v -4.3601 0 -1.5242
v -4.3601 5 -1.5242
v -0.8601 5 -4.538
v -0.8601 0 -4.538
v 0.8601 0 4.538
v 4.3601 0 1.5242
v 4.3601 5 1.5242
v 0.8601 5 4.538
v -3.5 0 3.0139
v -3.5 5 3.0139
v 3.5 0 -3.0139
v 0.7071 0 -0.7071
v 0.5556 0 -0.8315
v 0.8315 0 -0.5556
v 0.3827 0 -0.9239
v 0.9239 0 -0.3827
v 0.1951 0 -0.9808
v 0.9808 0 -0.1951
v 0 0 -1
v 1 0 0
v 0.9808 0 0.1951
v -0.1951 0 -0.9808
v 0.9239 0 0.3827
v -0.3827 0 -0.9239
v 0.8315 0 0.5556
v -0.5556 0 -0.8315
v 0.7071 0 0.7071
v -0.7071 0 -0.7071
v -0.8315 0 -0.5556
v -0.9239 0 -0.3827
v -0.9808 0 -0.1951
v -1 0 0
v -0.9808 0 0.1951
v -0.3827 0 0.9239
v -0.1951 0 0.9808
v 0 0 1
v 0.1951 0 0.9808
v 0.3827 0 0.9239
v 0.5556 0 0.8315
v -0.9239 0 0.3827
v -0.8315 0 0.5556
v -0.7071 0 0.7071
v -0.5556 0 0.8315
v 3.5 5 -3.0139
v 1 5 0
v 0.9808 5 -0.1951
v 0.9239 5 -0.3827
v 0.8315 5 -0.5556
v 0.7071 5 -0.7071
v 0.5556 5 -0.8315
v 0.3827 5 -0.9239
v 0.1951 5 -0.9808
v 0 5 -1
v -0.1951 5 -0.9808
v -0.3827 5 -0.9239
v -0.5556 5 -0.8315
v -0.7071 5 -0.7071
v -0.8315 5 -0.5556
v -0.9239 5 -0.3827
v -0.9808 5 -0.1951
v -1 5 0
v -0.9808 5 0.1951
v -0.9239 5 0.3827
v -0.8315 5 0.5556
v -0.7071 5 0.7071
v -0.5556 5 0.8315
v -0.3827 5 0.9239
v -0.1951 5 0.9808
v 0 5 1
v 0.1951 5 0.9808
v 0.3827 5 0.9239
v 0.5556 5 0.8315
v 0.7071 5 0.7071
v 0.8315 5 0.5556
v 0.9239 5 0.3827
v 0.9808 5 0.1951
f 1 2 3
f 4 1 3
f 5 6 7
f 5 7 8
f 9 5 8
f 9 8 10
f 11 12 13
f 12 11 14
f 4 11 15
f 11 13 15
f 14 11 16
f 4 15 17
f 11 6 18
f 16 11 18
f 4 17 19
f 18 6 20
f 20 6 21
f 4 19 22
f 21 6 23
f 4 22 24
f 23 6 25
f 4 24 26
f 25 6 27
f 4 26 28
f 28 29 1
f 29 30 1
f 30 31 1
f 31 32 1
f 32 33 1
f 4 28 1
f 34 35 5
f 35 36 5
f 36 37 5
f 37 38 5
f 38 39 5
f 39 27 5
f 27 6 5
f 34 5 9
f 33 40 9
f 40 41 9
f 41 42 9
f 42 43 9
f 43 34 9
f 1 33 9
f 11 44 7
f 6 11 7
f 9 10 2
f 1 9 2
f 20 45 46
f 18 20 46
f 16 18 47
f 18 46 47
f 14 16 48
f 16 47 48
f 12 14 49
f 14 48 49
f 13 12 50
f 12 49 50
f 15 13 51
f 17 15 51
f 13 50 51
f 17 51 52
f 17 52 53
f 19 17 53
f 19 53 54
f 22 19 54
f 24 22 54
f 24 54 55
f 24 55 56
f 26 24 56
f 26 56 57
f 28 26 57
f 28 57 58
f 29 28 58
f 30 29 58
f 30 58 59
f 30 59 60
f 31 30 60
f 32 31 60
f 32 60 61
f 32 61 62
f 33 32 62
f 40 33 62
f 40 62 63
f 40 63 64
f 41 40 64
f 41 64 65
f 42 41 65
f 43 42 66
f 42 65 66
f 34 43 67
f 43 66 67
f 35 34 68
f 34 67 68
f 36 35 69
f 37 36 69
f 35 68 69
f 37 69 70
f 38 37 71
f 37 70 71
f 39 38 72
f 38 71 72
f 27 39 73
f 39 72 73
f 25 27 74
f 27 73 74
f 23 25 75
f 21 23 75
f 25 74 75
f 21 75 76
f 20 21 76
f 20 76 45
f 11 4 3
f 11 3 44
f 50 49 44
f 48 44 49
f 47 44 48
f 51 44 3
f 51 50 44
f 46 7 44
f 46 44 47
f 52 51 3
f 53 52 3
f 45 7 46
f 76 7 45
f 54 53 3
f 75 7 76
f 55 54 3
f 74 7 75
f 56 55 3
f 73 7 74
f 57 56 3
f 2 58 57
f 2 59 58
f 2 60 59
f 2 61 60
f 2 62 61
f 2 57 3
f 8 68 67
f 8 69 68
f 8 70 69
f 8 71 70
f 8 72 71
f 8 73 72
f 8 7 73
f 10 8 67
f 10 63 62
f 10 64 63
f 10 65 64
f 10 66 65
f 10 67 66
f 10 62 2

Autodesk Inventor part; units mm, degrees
ref_plane "YZ Plane" through (0, 0, 0) normal (1, 0, 0) x (0, 1, 0)
ref_plane "XZ Plane" through (0, 0, 0) normal (0, 1, 0) x (-1, 0, 0)
ref_plane "XY Plane" through (0, 0, 0) normal (0, 0, 1) x (1, 0, 0)
sketch "Szkic1" plane through (0, 0, 0) normal (0, 1, 0) x (-1, 0, 0)
  line L0 (0.8601, -4.538) -> (-3.5, -3.0139)
  line L1 (-3.5, -3.0139) -> (-4.3601, 1.5242)
  line L2 (-4.3601, 1.5242) -> (-0.8601, 4.538)
  line L3 (-0.8601, 4.538) -> (3.5, 3.0139)
  line L4 (3.5, 3.0139) -> (4.3601, -1.5242)
  line L5 (4.3601, -1.5242) -> (0.8601, -4.538)
  point P0 (0, 0)
  point P1 (0, 0)
  dimension "d0" = 4
  dimension "d1" = 3.5
extrude "Wyciągnięcie proste1" add sketch "Szkic1" along normal blind 5
sketch "Szkic2" plane through (0, 5, 0) normal (0, 1, 0) x (1, 0, 0)
  circle A0 centre (0, 0) radius 1
  dimension "d4" = 2
extrude "Wyciągnięcie proste2" cut sketch "Szkic2" against normal blind 5
thread "Gwint1" size "M2x0.4" class "6H" standard "ANSI Metric M Profile" length 25
properties part number "nakretka_m2"
